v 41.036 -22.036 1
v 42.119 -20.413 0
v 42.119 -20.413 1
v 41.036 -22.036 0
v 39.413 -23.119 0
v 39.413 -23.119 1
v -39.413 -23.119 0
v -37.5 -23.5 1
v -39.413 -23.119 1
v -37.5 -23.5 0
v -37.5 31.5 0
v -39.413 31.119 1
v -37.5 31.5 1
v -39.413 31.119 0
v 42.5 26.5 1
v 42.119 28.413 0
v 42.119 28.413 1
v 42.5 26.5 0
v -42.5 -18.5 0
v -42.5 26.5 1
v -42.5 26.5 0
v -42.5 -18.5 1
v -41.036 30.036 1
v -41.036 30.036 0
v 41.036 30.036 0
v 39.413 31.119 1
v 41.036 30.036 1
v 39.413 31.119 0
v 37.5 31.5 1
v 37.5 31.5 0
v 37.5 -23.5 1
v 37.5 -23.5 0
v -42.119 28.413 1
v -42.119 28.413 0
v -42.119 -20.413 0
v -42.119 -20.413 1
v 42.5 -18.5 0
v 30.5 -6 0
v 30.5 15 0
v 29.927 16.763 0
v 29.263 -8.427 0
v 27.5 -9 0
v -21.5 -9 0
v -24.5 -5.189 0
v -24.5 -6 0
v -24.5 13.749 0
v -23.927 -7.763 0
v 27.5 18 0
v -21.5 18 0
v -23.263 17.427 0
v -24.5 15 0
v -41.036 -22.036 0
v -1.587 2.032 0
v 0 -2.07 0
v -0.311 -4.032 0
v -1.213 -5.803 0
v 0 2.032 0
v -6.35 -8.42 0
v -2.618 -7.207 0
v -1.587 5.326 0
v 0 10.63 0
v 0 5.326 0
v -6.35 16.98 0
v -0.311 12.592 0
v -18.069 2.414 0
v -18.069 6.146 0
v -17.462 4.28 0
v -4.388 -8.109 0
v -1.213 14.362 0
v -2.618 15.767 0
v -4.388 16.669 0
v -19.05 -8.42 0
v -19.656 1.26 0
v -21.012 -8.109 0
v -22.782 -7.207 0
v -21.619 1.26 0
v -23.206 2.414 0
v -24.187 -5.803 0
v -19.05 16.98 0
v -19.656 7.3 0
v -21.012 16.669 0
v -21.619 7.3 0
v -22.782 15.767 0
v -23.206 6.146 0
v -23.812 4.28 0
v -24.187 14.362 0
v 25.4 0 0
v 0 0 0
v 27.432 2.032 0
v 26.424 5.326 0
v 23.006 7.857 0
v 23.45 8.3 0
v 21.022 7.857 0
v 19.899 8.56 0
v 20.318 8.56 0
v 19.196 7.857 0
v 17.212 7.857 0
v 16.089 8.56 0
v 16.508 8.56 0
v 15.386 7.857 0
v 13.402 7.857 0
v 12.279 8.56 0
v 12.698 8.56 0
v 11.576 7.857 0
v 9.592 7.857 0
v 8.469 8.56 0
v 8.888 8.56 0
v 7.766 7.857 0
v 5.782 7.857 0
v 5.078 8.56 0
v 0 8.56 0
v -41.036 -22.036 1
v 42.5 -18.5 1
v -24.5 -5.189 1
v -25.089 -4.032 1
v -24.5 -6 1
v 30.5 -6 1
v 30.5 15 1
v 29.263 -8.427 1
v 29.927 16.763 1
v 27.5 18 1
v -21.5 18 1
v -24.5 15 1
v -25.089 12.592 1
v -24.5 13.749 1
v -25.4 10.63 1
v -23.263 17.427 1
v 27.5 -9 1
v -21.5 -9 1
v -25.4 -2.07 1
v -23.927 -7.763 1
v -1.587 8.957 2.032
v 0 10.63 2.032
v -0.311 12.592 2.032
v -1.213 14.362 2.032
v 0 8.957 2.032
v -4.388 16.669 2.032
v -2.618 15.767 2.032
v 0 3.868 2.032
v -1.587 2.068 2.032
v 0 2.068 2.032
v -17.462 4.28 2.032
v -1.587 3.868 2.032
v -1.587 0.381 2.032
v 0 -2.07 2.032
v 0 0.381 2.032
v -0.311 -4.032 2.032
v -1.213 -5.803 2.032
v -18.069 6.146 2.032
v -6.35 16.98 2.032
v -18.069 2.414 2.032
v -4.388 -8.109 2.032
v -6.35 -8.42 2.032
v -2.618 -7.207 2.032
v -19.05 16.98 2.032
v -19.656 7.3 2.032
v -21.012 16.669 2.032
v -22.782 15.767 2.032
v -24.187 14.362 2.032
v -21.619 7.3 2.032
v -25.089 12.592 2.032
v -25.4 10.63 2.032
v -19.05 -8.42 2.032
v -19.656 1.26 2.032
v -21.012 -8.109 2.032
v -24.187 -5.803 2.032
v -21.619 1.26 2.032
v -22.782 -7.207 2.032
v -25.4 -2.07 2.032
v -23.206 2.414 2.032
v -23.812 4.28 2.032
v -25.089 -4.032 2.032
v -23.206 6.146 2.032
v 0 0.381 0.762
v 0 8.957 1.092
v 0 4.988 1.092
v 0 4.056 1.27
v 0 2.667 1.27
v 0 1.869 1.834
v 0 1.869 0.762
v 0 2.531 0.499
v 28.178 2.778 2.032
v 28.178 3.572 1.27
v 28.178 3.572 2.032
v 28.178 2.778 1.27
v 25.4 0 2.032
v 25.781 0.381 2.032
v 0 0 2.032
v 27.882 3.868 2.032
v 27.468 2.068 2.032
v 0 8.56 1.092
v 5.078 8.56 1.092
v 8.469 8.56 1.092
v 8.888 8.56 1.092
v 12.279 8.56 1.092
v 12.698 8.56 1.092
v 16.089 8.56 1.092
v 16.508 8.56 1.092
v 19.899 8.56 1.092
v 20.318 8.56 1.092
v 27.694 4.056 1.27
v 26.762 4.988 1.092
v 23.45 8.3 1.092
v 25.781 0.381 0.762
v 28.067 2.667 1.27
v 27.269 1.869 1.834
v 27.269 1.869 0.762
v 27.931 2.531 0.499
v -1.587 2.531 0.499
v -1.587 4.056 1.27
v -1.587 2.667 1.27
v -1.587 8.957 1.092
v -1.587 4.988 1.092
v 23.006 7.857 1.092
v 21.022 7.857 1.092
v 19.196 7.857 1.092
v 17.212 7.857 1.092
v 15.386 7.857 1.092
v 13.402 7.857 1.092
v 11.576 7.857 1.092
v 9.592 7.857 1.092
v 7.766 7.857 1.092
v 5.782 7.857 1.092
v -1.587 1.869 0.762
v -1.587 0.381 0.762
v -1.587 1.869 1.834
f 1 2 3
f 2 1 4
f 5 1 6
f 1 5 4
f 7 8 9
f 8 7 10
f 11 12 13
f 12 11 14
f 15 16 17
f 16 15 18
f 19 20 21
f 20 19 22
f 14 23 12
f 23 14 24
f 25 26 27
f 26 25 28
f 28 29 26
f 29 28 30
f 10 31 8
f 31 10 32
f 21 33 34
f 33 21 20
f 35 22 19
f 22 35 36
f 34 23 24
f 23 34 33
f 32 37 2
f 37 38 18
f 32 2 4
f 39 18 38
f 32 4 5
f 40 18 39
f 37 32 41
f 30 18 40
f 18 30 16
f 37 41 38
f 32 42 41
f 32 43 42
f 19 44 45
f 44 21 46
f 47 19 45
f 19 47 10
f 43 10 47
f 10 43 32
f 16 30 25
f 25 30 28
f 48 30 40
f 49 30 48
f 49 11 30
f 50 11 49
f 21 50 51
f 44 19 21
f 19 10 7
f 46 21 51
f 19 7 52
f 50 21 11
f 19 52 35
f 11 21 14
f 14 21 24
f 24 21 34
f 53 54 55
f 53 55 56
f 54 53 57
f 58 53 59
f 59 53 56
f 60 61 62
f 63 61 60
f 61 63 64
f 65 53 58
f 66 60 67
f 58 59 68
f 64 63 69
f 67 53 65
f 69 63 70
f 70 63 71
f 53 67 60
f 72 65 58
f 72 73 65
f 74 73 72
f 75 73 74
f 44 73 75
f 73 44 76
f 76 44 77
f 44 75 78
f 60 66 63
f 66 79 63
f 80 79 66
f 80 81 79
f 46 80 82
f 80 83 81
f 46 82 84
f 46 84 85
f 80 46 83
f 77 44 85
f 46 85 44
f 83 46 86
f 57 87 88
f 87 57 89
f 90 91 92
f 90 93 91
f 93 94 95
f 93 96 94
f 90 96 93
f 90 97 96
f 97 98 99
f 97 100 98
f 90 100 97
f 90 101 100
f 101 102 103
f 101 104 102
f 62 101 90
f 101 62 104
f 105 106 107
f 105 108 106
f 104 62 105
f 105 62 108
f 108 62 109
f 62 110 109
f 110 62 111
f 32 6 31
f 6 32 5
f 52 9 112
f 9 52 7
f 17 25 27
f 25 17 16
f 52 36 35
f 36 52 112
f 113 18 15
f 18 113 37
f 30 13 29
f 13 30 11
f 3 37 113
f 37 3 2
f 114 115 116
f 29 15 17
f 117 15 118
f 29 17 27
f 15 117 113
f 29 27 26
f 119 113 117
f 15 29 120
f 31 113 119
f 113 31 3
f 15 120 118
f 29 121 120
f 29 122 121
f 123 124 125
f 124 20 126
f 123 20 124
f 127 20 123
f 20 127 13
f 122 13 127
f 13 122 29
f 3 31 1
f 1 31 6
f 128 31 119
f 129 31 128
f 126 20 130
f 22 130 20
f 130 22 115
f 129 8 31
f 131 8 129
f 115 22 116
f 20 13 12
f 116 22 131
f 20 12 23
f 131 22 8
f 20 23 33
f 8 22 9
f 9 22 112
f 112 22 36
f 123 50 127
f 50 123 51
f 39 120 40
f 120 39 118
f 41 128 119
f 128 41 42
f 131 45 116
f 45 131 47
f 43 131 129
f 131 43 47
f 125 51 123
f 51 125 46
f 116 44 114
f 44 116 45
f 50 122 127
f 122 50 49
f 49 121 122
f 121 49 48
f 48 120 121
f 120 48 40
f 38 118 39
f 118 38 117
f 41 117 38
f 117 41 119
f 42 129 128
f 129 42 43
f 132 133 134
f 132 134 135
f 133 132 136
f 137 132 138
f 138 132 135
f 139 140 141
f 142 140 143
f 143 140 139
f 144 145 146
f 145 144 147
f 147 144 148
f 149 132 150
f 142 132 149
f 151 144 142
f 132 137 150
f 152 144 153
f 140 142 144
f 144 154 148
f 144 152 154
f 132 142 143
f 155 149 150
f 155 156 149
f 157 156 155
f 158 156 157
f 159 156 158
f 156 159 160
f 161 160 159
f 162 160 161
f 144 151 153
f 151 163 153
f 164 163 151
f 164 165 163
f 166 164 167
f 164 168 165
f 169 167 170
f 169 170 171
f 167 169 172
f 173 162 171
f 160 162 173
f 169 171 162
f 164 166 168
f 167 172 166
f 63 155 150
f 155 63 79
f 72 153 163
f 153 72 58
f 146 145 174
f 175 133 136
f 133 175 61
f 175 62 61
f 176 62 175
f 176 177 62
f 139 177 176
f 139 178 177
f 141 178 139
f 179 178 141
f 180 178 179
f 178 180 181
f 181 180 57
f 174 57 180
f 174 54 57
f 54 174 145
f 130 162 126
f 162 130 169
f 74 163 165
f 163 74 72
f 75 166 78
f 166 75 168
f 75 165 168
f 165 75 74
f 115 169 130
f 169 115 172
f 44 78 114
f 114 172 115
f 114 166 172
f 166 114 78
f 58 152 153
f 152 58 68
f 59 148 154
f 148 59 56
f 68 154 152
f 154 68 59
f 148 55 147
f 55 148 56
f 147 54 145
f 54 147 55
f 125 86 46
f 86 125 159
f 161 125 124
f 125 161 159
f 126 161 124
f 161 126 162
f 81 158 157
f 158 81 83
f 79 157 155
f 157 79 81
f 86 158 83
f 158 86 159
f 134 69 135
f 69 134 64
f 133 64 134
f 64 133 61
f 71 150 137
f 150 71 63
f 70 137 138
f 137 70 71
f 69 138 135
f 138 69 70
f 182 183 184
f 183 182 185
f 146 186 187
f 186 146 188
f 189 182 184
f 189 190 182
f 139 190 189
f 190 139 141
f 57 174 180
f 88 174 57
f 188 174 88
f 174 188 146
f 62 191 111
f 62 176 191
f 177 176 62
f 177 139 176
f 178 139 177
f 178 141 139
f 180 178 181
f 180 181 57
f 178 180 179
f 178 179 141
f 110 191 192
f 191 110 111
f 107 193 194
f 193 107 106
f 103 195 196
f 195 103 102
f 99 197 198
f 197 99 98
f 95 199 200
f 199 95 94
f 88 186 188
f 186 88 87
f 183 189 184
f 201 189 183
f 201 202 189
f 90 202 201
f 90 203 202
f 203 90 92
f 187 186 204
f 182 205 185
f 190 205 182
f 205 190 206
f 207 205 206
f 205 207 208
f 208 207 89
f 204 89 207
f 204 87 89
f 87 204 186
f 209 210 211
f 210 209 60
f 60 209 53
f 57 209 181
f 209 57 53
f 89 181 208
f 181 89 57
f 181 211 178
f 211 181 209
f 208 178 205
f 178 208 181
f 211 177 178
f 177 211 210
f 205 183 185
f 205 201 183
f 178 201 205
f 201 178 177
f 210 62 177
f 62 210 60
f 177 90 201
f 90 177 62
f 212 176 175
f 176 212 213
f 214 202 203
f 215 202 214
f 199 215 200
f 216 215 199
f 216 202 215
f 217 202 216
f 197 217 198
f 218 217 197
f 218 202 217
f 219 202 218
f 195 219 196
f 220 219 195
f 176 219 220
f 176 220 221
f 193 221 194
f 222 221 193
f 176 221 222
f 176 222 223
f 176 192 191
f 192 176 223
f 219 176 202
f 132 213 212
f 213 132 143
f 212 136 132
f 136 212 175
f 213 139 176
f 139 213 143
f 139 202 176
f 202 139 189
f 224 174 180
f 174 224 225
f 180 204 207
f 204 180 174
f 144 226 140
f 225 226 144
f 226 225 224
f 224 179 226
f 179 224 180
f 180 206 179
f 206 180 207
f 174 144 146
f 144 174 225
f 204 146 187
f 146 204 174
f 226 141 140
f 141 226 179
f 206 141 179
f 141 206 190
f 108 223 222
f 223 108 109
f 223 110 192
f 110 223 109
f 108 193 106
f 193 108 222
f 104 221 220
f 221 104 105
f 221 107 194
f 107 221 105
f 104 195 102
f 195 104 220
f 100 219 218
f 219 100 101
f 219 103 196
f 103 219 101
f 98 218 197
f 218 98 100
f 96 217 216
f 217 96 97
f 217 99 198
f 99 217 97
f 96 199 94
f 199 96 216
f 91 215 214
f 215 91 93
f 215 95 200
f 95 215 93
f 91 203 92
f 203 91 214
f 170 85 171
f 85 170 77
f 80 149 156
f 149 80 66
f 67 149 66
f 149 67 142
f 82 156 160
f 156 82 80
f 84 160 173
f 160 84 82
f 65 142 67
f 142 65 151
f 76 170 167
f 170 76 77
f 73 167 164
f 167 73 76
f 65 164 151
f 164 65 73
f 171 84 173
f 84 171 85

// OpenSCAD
// This is a customizer Remix of http://www.thingiverse.com/thing:8925 by nrp.  
// I added the "credit card" and the ability to enter your numbers without using SCAD.  Everything else is original work from original design.


// Physical Keygen - by Nirav Patel <http://eclecti.cc>
//
// Generate a duplicate of a Kwikset KW1 key by editing the last line of the file
// and entering in the key code of the lock.  If you don't know the key code,
// you can measure the key and compare the numbers at:
// http://web.archive.org/web/20050217020917fw_/http://dlaco.com/spacing/tips.htm
//
// This work is licensed under a Creative Commons Attribution 3.0 Unported License.

// Since the keys and locks I have were all designed in imperial units, the
// constants in this file will be defined in inches.  The mm function
// allows us to retain the proper size for exporting a metric STL.

// First measurement
First_measurement = 1; //[1:7]
// First measurement
Second_measurement = 1; //[1:7]
// First measurement
Third_measurement = 1; //[1:7]
// First measurement
Fourth_measurement = 1; //[1:7]
// First measurement
Fifth_measurement = 1; //[1:7]


function mm(i) = i*25.4;

module rounded(size, r) {
    union() {
        translate([r, 0, 0]) cube([size[0]-2*r, size[1], size[2]]);
        translate([0, r, 0]) cube([size[0], size[1]-2*r, size[2]]);
        translate([r, r, 0]) cylinder(h=size[2], r=r);
        translate([size[0]-r, r, 0]) cylinder(h=size[2], r=r);
        translate([r, size[1]-r, 0]) cylinder(h=size[2], r=r);
        translate([size[0]-r, size[1]-r, 0]) cylinder(h=size[2], r=r);
    }
}

module bit() {
    w = mm(1/4);
    difference() {
        translate([-w/2, 0, 0]) cube([w, mm(1), w]);
        translate([-mm(5/128), 0, 0]) rotate([0, 0, 135]) cube([w, w, w]);
        translate([mm(5/128), 0, 0]) rotate([0, 0, -45]) cube([w, w, w]);
    }
}

// Kwikset KW1 5 pin key.  The measurements are mostly guesses based on reverse
// engineering some keys I have and some publicly available information.
module kw1(bits) {
    // You may need to adjust these to fit your specific printer settings
    thickness = mm(0.080);
    length = mm(9/8);
    width = mm(.337);
    
    shoulder = mm(.247);
    pin_spacing = mm(.15);
    depth_inc = mm(.023);
    
    // A fudge factor.  Printing with your average RepRap, the bottom layer is
    // going to be squeezed larger than you want. You can make the pins
    // go slighly deeper by a fudge amount to make up for it if you aren't
    // adjusting for it elsewhere like Skeinforge or in your firmware.
    fudge = 0.5;

    
    // Adding the credit card to the key
    difference(){

    // The Card
    translate([0,4]){
        linear_extrude(height=1)offset(r=5)
    square([75, 45], center=true);
                    }
    // The empty space in the card
       
    translate([-21.5,-6]){
        linear_extrude(height=1)offset(r=3)
    square([49, 21]);
                         }
                }
  
    // Handle size
    h_l = mm(1);
    h_w = mm(1);
    h_d = mm(1/16);
    difference() {
        // blade and key handle
        union() {
            translate([-h_l, -h_w/2 + width/2, 0]) rounded([h_l, h_w, thickness], mm(1/4));
            // cut a little off the tip to avoid going too long
            cube([length - mm(1/64), width, thickness]);
        }
        
        // chamfer the tip
        translate([length, mm(1/8), 0]) {
            rotate([0, 0, 45]) cube([10, 10, thickness]);
            rotate([0, 0, 225]) cube([10, 10, thickness]);
        }
        
        // put in a hole for keychain use
        translate([-h_l + mm(3/16), width/2, 0]) cylinder(h=thickness, r=mm(1/8));
        
        // cut the channels in the key.  designed more for printability than accuracy
        union() {
            translate([-h_d, mm(.105), mm(.025)]) rotate([225, 0, 0]) cube([length + h_d, width, width]);
            translate([-h_d, mm(.105), mm(.05)]) rotate([260, 0, 0]) cube([length + h_d, thickness/2, mm(1/32)]);
            translate([-h_d, mm(.105), 0]) cube([length + h_d, mm(7/128), mm(.05)]);
            translate([-h_d, mm(.105) + mm(7/128), mm(.05)]) rotate([225, 0, 0]) cube([length + h_d, mm(3/64), thickness]);
        }
        
        translate([-h_d, width - mm(9/64), mm(.043)]) {
            cube([length + h_d, width - (width - mm(10/64)), thickness]);
            rotate([50, 0, 0]) cube([length + h_d, width, thickness]);
        }
        
        union() {
            translate([-h_d, mm(0.015), mm(.03)]) cube([length + h_d, mm(15/256), thickness]);
            translate([-h_d, mm(0.015) + mm(13/256), thickness - mm(1/64)]) rotate([45, 0, 0]) cube([length + h_d, mm(1/16), mm(1/16)]);
        }
        
        // Do the actual bitting
        for (b = [0:4]) {
            // KW1 doesn't have a 0 value and instead has 1 start around .008" deep
            translate([shoulder + fudge + b*pin_spacing, width - mm(.008) - (bits[b] - 1)*depth_inc - fudge, 0]) bit();
        }
    }
}

// This sample key goes to a lock that is sitting disassembled on my desk
// Flip the key over for easy printing
kw1([First_measurement,Second_measurement,Third_measurement,Fourth_measurement,Fifth_measurement]);
